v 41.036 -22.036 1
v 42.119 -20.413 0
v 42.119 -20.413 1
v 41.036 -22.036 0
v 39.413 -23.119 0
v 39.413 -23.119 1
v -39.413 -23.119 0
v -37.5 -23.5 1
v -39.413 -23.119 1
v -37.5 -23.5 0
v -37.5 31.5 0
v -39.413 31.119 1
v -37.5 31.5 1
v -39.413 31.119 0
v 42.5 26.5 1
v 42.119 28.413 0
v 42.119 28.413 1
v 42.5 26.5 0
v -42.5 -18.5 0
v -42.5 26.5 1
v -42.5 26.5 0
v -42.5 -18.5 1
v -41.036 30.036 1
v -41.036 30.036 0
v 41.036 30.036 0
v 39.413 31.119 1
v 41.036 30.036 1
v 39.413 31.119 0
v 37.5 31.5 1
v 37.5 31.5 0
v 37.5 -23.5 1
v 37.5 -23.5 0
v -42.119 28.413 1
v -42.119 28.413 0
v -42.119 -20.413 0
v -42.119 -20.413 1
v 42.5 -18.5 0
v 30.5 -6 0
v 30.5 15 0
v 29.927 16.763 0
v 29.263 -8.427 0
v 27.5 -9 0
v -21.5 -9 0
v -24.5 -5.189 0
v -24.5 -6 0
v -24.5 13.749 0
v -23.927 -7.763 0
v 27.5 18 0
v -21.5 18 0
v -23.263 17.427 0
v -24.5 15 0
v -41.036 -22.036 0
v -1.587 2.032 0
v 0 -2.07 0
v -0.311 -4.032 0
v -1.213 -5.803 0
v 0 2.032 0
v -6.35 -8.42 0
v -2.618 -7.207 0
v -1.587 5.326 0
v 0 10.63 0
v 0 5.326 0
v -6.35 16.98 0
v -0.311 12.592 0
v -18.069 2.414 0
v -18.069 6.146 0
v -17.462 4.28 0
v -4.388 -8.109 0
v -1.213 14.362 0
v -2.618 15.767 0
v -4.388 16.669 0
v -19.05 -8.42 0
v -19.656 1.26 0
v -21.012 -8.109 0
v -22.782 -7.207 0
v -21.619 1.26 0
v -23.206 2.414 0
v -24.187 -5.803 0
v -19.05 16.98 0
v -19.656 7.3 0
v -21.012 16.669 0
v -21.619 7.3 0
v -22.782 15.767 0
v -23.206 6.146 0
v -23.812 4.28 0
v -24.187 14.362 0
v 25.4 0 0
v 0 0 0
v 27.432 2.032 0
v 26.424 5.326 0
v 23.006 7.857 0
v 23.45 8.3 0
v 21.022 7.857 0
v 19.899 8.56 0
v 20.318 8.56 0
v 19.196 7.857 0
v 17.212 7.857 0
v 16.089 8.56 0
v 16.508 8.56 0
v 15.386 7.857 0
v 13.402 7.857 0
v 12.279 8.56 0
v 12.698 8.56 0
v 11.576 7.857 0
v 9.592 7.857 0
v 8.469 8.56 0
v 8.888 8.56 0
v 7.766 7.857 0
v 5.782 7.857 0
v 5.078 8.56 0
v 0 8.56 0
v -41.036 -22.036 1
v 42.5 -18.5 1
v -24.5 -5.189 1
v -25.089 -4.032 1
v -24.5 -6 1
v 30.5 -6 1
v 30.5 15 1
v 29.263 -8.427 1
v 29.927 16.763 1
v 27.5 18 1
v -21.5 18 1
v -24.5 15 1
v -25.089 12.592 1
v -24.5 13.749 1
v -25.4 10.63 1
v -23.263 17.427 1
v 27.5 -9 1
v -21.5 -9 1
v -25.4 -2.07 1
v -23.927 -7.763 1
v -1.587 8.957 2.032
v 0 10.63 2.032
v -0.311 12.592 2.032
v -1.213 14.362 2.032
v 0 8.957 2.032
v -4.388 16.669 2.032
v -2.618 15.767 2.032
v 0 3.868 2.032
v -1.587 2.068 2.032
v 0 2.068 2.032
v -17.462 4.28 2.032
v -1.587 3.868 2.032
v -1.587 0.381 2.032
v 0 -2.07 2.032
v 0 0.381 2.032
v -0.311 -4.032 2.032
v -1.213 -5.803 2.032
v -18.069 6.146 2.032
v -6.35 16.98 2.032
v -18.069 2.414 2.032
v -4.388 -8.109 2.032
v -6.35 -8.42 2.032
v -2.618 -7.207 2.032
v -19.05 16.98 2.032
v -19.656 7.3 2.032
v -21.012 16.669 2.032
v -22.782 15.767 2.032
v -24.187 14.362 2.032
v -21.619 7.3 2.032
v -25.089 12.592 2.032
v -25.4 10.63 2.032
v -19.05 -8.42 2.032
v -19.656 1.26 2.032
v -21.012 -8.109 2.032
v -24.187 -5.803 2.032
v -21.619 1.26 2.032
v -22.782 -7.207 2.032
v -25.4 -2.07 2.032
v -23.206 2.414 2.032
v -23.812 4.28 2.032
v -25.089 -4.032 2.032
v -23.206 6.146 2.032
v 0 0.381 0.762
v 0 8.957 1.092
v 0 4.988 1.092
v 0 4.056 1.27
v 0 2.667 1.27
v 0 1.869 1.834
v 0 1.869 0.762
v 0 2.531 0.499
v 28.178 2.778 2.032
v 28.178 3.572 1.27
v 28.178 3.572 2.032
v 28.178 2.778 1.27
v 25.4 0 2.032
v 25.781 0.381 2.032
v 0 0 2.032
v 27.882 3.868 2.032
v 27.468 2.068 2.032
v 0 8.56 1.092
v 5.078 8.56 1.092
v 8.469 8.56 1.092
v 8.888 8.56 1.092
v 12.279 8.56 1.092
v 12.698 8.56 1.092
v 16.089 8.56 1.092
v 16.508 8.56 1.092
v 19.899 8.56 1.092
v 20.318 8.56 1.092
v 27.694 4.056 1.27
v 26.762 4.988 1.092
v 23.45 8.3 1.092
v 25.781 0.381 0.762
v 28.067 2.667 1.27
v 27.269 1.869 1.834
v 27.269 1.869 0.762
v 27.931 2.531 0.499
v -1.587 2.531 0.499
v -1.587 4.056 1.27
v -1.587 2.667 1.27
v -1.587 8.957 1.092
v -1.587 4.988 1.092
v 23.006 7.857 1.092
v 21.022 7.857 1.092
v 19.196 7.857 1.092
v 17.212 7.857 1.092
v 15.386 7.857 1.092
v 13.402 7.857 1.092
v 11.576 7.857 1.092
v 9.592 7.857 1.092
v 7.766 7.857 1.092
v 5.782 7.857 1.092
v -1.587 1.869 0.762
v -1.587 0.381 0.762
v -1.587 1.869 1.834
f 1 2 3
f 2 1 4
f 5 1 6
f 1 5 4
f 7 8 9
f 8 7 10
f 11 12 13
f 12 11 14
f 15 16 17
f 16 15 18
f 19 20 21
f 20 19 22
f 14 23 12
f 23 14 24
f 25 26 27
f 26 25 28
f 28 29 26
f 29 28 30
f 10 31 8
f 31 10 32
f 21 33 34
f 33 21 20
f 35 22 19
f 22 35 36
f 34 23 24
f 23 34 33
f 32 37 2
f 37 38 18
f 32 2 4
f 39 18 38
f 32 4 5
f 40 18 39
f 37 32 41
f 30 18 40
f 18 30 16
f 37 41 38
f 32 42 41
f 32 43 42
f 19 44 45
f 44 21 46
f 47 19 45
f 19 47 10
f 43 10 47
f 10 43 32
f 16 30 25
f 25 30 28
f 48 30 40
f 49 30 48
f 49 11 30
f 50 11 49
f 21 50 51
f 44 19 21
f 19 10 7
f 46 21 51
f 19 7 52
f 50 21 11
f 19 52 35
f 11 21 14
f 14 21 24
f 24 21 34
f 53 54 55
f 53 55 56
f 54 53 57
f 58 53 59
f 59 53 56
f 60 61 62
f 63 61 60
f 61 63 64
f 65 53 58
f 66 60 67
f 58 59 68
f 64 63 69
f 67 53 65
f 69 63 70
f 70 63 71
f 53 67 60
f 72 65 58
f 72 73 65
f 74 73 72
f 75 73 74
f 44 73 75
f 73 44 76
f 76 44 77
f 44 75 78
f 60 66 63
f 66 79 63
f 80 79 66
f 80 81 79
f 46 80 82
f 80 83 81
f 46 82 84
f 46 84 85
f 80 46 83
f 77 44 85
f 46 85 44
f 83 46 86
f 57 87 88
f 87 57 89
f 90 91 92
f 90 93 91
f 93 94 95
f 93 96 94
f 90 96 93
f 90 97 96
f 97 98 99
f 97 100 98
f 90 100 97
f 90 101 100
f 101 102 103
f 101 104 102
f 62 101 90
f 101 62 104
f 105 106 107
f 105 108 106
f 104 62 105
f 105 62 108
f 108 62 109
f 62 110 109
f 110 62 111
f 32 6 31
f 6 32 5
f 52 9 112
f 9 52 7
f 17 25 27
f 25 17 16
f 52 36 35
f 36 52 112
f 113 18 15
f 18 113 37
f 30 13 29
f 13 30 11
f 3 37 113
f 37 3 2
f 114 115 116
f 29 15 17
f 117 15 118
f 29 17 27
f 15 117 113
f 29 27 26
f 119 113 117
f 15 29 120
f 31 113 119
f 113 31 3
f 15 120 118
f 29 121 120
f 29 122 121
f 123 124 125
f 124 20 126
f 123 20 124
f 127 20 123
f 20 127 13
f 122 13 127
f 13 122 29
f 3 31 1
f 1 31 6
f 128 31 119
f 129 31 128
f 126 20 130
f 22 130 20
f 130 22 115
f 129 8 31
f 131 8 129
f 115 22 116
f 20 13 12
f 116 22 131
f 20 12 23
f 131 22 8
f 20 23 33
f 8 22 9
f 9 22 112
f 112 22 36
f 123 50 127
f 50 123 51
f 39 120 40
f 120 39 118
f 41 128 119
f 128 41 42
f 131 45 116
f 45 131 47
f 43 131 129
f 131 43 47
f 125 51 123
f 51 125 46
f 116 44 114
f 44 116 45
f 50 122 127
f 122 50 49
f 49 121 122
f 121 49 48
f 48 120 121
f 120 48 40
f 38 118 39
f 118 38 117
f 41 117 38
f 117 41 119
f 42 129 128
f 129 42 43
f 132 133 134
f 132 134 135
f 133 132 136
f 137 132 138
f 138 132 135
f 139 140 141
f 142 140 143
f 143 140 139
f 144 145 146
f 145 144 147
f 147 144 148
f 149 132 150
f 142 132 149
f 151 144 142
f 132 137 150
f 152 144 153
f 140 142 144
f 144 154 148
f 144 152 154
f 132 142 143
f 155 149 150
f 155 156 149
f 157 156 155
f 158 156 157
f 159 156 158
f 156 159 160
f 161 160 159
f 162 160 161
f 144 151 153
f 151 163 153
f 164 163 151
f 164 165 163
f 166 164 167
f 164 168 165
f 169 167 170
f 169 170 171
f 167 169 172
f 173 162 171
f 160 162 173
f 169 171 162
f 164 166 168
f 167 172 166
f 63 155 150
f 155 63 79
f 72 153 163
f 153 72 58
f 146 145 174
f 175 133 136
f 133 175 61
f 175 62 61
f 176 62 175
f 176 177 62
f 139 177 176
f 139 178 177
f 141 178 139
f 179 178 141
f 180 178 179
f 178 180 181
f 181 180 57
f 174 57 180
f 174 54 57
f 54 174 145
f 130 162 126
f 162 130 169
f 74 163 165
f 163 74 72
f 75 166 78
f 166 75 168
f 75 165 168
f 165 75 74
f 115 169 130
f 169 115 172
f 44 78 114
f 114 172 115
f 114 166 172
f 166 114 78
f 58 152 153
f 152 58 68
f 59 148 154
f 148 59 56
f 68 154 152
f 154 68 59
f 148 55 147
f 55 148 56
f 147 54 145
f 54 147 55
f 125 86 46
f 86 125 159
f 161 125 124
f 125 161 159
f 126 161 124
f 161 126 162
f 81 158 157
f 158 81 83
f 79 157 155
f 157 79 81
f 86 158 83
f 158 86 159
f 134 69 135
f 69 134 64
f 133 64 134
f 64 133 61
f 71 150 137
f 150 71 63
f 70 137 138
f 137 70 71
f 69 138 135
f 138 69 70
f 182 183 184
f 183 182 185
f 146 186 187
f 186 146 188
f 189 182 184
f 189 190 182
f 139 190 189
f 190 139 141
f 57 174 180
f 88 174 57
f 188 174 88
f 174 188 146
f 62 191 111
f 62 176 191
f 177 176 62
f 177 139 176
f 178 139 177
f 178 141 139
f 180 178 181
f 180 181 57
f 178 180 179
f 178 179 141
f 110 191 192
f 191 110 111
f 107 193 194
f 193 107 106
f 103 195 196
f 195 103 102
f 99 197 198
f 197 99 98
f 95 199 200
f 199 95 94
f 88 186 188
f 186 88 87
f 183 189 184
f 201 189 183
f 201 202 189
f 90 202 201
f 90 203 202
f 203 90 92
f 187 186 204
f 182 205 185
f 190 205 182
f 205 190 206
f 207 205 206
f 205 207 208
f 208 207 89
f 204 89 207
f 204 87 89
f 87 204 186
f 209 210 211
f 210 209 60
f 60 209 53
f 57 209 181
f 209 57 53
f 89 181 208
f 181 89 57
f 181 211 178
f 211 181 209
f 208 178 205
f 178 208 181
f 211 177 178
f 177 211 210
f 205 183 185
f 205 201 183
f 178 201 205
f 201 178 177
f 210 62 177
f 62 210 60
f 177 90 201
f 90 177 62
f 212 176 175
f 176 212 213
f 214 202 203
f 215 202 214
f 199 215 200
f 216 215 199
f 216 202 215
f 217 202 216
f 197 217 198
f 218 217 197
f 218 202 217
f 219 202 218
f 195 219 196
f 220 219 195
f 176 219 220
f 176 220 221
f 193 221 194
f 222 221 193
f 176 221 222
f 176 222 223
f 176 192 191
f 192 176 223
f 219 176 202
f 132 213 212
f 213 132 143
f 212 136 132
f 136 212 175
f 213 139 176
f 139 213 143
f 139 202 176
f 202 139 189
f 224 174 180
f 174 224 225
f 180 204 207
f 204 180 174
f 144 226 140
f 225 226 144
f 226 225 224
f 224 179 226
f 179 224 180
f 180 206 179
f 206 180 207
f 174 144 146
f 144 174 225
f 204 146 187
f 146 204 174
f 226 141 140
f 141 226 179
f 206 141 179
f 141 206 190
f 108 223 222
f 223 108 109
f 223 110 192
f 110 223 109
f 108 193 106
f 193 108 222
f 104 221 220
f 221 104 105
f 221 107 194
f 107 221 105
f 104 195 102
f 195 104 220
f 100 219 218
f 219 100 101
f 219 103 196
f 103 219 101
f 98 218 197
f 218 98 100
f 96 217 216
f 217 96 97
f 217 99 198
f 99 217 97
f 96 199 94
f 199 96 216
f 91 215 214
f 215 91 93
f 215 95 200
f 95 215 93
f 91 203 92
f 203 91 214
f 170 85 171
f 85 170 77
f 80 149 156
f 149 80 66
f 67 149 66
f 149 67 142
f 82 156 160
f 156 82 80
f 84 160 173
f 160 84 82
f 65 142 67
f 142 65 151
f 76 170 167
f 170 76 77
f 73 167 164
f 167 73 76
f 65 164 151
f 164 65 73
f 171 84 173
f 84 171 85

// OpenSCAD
// This is a customizer Remix of http://www.thingiverse.com/thing:8925 by nrp.  
// I added the "credit card" and the ability to enter your numbers without using SCAD.  Everything else is original work from original design.


// Physical Keygen - by Nirav Patel <http://eclecti.cc>
//
// Generate a duplicate of a Kwikset KW1 key by editing the last line of the file
// and entering in the key code of the lock.  If you don't know the key code,
// you can measure the key and compare the numbers at:
// http://web.archive.org/web/20050217020917fw_/http://dlaco.com/spacing/tips.htm
//
// This work is licensed under a Creative Commons Attribution 3.0 Unported License.

// Since the keys and locks I have were all designed in imperial units, the
// constants in this file will be defined in inches.  The mm function
// allows us to retain the proper size for exporting a metric STL.

// First measurement
First_measurement = 1; //[1:7]
// First measurement
Second_measurement = 1; //[1:7]
// First measurement
Third_measurement = 1; //[1:7]
// First measurement
Fourth_measurement = 1; //[1:7]
// First measurement
Fifth_measurement = 1; //[1:7]


function mm(i) = i*25.4;

module rounded(size, r) {
    union() {
        translate([r, 0, 0]) cube([size[0]-2*r, size[1], size[2]]);
        translate([0, r, 0]) cube([size[0], size[1]-2*r, size[2]]);
        translate([r, r, 0]) cylinder(h=size[2], r=r);
        translate([size[0]-r, r, 0]) cylinder(h=size[2], r=r);
        translate([r, size[1]-r, 0]) cylinder(h=size[2], r=r);
        translate([size[0]-r, size[1]-r, 0]) cylinder(h=size[2], r=r);
    }
}

module bit() {
    w = mm(1/4);
    difference() {
        translate([-w/2, 0, 0]) cube([w, mm(1), w]);
        translate([-mm(5/128), 0, 0]) rotate([0, 0, 135]) cube([w, w, w]);
        translate([mm(5/128), 0, 0]) rotate([0, 0, -45]) cube([w, w, w]);
    }
}

// Kwikset KW1 5 pin key.  The measurements are mostly guesses based on reverse
// engineering some keys I have and some publicly available information.
module kw1(bits) {
    // You may need to adjust these to fit your specific printer settings
    thickness = mm(0.080);
    length = mm(9/8);
    width = mm(.337);
    
    shoulder = mm(.247);
    pin_spacing = mm(.15);
    depth_inc = mm(.023);
    
    // A fudge factor.  Printing with your average RepRap, the bottom layer is
    // going to be squeezed larger than you want. You can make the pins
    // go slighly deeper by a fudge amount to make up for it if you aren't
    // adjusting for it elsewhere like Skeinforge or in your firmware.
    fudge = 0.5;

    
    // Adding the credit card to the key
    difference(){

    // The Card
    translate([0,4]){
        linear_extrude(height=1)offset(r=5)
    square([75, 45], center=true);
                    }
    // The empty space in the card
       
    translate([-21.5,-6]){
        linear_extrude(height=1)offset(r=3)
    square([49, 21]);
                         }
                }
  
    // Handle size
    h_l = mm(1);
    h_w = mm(1);
    h_d = mm(1/16);
    difference() {
        // blade and key handle
        union() {
            translate([-h_l, -h_w/2 + width/2, 0]) rounded([h_l, h_w, thickness], mm(1/4));
            // cut a little off the tip to avoid going too long
            cube([length - mm(1/64), width, thickness]);
        }
        
        // chamfer the tip
        translate([length, mm(1/8), 0]) {
            rotate([0, 0, 45]) cube([10, 10, thickness]);
            rotate([0, 0, 225]) cube([10, 10, thickness]);
        }
        
        // put in a hole for keychain use
        translate([-h_l + mm(3/16), width/2, 0]) cylinder(h=thickness, r=mm(1/8));
        
        // cut the channels in the key.  designed more for printability than accuracy
        union() {
            translate([-h_d, mm(.105), mm(.025)]) rotate([225, 0, 0]) cube([length + h_d, width, width]);
            translate([-h_d, mm(.105), mm(.05)]) rotate([260, 0, 0]) cube([length + h_d, thickness/2, mm(1/32)]);
            translate([-h_d, mm(.105), 0]) cube([length + h_d, mm(7/128), mm(.05)]);
            translate([-h_d, mm(.105) + mm(7/128), mm(.05)]) rotate([225, 0, 0]) cube([length + h_d, mm(3/64), thickness]);
        }
        
        translate([-h_d, width - mm(9/64), mm(.043)]) {
            cube([length + h_d, width - (width - mm(10/64)), thickness]);
            rotate([50, 0, 0]) cube([length + h_d, width, thickness]);
        }
        
        union() {
            translate([-h_d, mm(0.015), mm(.03)]) cube([length + h_d, mm(15/256), thickness]);
            translate([-h_d, mm(0.015) + mm(13/256), thickness - mm(1/64)]) rotate([45, 0, 0]) cube([length + h_d, mm(1/16), mm(1/16)]);
        }
        
        // Do the actual bitting
        for (b = [0:4]) {
            // KW1 doesn't have a 0 value and instead has 1 start around .008" deep
            translate([shoulder + fudge + b*pin_spacing, width - mm(.008) - (bits[b] - 1)*depth_inc - fudge, 0]) bit();
        }
    }
}

// This sample key goes to a lock that is sitting disassembled on my desk
// Flip the key over for easy printing
kw1([First_measurement,Second_measurement,Third_measurement,Fourth_measurement,Fifth_measurement]);
